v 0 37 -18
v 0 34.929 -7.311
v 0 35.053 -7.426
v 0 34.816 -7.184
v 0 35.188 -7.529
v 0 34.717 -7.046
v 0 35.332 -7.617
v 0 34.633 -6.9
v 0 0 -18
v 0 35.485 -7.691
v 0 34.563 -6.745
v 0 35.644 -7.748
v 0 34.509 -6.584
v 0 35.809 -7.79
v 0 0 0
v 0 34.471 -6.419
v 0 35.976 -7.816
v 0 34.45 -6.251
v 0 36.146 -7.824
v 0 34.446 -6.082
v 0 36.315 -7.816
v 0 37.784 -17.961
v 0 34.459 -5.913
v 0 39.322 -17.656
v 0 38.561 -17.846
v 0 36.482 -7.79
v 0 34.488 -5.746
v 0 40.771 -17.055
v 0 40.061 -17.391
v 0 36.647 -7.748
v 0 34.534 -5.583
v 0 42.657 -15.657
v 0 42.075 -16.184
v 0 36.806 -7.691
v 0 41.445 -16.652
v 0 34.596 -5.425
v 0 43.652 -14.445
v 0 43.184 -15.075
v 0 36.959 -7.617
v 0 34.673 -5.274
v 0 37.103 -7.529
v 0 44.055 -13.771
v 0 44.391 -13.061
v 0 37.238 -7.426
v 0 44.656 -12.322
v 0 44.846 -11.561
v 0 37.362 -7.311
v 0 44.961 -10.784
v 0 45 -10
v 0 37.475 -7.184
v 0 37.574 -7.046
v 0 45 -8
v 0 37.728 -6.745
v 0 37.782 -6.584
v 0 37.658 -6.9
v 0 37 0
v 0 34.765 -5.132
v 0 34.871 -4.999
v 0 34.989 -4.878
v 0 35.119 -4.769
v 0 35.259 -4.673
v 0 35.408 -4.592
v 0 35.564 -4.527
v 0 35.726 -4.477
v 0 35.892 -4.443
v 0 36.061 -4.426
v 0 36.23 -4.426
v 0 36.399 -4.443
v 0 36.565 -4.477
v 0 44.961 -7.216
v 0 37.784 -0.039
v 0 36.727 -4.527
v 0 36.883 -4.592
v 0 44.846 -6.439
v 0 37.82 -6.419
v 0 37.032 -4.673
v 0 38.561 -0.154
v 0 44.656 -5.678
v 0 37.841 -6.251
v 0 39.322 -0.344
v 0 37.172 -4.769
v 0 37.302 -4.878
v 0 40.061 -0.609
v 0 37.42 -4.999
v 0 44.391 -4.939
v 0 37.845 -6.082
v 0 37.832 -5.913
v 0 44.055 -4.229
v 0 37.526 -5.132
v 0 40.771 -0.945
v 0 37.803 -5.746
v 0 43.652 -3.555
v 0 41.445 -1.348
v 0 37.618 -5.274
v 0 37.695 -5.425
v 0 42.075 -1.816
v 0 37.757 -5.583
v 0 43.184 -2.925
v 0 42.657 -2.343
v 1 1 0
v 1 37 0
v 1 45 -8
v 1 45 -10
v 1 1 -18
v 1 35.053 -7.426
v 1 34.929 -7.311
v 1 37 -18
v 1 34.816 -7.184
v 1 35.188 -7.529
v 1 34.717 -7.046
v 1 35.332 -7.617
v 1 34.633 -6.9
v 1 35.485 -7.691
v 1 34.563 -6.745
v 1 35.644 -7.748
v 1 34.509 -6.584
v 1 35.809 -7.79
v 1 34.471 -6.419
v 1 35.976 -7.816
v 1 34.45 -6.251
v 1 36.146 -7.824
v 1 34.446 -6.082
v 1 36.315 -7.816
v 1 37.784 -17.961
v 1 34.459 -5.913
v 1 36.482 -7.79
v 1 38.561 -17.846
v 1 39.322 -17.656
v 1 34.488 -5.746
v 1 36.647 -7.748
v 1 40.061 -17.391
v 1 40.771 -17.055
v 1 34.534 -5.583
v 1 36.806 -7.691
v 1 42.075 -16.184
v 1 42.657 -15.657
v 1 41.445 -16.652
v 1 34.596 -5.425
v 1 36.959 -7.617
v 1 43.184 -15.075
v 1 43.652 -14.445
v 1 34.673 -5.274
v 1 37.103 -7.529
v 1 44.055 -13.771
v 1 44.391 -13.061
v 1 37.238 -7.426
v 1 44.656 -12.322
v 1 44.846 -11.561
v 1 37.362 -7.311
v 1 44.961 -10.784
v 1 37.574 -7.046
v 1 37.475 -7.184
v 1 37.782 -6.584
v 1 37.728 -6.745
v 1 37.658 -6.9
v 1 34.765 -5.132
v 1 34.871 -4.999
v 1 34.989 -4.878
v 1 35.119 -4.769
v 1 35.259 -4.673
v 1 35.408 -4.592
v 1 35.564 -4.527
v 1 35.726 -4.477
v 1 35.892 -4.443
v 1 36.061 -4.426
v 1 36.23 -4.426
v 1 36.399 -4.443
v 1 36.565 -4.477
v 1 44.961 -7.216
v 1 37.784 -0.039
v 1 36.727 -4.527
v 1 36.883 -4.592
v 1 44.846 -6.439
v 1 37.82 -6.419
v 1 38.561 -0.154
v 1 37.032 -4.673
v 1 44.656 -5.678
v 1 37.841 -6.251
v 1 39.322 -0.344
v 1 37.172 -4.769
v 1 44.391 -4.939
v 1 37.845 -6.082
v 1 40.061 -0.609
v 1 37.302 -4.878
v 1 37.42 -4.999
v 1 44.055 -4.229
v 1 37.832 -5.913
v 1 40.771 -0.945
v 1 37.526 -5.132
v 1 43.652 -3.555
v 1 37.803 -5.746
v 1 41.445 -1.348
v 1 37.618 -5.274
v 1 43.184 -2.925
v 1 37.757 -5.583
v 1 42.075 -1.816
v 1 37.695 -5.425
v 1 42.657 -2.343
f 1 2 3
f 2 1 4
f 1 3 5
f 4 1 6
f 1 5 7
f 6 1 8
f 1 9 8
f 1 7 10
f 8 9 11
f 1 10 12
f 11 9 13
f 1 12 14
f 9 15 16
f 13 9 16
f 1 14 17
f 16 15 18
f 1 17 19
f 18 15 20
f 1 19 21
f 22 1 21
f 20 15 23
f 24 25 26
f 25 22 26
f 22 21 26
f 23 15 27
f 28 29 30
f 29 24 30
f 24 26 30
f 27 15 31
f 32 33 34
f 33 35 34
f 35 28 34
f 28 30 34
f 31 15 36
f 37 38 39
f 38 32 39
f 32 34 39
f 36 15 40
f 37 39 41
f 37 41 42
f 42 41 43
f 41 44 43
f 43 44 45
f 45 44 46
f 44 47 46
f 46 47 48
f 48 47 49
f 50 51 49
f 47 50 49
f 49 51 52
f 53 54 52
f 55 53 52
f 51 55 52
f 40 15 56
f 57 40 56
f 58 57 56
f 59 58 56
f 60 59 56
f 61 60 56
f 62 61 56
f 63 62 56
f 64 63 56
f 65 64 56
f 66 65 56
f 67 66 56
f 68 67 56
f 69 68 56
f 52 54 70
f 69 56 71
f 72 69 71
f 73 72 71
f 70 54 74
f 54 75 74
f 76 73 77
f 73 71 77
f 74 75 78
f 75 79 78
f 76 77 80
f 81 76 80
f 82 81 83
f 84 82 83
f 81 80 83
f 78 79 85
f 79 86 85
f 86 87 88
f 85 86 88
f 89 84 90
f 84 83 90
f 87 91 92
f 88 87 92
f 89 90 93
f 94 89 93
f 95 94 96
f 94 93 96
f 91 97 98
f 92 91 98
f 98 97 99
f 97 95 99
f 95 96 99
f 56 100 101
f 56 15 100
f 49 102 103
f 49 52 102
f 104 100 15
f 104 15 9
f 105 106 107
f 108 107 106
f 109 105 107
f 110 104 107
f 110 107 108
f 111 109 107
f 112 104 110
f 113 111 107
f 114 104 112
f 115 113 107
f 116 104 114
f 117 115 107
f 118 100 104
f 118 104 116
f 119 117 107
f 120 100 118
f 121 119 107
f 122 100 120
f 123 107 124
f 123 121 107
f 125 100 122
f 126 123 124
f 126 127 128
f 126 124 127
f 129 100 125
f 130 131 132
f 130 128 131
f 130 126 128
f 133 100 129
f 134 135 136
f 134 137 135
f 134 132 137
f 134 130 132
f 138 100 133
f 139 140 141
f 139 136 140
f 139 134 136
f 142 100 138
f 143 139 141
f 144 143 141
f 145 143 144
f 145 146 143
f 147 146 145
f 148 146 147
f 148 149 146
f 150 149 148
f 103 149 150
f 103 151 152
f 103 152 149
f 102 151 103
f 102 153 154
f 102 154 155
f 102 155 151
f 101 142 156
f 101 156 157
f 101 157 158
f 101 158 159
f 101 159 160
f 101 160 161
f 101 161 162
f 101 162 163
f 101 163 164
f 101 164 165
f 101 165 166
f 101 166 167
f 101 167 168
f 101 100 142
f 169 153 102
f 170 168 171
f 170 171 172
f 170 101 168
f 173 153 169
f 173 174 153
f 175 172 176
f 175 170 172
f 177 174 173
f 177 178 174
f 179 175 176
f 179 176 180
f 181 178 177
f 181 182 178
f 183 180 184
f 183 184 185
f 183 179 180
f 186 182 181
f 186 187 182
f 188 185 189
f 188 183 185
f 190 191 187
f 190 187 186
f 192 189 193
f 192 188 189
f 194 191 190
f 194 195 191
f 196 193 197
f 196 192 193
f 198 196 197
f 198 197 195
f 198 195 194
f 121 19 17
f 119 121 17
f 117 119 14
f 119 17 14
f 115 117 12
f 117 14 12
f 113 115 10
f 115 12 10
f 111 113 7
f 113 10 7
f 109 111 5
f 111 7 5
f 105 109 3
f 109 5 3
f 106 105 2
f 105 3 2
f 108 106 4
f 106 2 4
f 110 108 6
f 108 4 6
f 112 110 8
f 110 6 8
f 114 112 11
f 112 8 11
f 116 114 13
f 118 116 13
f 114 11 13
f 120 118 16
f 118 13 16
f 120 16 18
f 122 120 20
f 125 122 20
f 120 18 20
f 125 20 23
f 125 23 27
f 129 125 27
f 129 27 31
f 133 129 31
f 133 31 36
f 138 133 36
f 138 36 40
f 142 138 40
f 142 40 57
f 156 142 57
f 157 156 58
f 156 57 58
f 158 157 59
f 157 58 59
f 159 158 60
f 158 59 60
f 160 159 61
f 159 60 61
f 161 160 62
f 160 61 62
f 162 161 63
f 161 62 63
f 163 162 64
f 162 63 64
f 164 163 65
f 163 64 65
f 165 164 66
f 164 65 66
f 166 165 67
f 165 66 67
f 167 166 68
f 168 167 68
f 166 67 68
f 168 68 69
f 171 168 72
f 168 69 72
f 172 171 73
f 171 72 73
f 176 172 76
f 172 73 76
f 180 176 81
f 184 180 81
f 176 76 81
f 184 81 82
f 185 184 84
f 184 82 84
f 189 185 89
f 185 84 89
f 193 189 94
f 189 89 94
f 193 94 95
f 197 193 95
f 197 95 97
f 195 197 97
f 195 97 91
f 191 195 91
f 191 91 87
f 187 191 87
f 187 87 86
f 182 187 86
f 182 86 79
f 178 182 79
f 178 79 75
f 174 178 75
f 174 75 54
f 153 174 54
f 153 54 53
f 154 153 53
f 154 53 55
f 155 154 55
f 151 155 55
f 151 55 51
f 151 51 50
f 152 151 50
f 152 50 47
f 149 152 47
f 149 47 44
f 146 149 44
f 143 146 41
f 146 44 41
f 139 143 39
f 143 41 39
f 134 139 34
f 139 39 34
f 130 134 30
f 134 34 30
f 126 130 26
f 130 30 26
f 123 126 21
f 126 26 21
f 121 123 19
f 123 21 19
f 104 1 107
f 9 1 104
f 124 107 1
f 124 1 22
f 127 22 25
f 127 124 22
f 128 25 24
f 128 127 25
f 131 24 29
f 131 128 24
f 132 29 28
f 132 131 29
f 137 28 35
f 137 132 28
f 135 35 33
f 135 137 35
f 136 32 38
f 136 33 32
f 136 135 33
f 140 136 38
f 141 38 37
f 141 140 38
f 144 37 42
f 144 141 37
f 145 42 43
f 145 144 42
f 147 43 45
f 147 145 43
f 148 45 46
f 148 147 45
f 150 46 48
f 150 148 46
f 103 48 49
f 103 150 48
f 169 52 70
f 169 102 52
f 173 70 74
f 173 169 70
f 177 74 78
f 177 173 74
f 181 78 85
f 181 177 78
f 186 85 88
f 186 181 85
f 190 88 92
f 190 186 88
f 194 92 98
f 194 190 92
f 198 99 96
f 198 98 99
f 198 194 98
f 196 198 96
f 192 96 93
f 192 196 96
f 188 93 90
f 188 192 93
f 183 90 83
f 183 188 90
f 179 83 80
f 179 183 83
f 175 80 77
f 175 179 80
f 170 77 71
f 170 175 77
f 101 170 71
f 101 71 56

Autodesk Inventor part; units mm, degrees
ref_plane "YZ Plane" through (0, 0, 0) normal (1, 0, 0) x (0, 1, 0)
ref_plane "XZ Plane" through (0, 0, 0) normal (0, 1, 0) x (-1, 0, 0)
ref_plane "XY Plane" through (0, 0, 0) normal (0, 0, 1) x (1, 0, 0)
sketch "Boceto1" plane through (0, 0, 0) normal (1, 0, 0) x (0, 1, 0)
  line L0 (0, 0) -> (45, 0)
  line L1 (45, 0) -> (45, -18)
  line L2 (45, -18) -> (0, -18)
  line L3 (0, -18) -> (0, 0)
  dimension "d2" = 45
  dimension "d3" = 18
extrude "Extrusión1" add sketch "Boceto1" along normal blind 1
chamfer "Chaflán1" distance 1 angle 45 1 edges at (1, 0, -9)
fillet "Empalme1" radius 8 2 edges at (0.5, 45, -18) (0.5, 45, 0)
sketch "Boceto2" plane through (1, 0, 0) normal (1, 0, 0) x (0, 0, -1)
  point P0 (6.124, 36.1455)
hole "Agujero1" at (1, 36.1455, -6.124) direction (-1, 0, 0) diameter 3.4 end through all
properties part number "platina_3"
